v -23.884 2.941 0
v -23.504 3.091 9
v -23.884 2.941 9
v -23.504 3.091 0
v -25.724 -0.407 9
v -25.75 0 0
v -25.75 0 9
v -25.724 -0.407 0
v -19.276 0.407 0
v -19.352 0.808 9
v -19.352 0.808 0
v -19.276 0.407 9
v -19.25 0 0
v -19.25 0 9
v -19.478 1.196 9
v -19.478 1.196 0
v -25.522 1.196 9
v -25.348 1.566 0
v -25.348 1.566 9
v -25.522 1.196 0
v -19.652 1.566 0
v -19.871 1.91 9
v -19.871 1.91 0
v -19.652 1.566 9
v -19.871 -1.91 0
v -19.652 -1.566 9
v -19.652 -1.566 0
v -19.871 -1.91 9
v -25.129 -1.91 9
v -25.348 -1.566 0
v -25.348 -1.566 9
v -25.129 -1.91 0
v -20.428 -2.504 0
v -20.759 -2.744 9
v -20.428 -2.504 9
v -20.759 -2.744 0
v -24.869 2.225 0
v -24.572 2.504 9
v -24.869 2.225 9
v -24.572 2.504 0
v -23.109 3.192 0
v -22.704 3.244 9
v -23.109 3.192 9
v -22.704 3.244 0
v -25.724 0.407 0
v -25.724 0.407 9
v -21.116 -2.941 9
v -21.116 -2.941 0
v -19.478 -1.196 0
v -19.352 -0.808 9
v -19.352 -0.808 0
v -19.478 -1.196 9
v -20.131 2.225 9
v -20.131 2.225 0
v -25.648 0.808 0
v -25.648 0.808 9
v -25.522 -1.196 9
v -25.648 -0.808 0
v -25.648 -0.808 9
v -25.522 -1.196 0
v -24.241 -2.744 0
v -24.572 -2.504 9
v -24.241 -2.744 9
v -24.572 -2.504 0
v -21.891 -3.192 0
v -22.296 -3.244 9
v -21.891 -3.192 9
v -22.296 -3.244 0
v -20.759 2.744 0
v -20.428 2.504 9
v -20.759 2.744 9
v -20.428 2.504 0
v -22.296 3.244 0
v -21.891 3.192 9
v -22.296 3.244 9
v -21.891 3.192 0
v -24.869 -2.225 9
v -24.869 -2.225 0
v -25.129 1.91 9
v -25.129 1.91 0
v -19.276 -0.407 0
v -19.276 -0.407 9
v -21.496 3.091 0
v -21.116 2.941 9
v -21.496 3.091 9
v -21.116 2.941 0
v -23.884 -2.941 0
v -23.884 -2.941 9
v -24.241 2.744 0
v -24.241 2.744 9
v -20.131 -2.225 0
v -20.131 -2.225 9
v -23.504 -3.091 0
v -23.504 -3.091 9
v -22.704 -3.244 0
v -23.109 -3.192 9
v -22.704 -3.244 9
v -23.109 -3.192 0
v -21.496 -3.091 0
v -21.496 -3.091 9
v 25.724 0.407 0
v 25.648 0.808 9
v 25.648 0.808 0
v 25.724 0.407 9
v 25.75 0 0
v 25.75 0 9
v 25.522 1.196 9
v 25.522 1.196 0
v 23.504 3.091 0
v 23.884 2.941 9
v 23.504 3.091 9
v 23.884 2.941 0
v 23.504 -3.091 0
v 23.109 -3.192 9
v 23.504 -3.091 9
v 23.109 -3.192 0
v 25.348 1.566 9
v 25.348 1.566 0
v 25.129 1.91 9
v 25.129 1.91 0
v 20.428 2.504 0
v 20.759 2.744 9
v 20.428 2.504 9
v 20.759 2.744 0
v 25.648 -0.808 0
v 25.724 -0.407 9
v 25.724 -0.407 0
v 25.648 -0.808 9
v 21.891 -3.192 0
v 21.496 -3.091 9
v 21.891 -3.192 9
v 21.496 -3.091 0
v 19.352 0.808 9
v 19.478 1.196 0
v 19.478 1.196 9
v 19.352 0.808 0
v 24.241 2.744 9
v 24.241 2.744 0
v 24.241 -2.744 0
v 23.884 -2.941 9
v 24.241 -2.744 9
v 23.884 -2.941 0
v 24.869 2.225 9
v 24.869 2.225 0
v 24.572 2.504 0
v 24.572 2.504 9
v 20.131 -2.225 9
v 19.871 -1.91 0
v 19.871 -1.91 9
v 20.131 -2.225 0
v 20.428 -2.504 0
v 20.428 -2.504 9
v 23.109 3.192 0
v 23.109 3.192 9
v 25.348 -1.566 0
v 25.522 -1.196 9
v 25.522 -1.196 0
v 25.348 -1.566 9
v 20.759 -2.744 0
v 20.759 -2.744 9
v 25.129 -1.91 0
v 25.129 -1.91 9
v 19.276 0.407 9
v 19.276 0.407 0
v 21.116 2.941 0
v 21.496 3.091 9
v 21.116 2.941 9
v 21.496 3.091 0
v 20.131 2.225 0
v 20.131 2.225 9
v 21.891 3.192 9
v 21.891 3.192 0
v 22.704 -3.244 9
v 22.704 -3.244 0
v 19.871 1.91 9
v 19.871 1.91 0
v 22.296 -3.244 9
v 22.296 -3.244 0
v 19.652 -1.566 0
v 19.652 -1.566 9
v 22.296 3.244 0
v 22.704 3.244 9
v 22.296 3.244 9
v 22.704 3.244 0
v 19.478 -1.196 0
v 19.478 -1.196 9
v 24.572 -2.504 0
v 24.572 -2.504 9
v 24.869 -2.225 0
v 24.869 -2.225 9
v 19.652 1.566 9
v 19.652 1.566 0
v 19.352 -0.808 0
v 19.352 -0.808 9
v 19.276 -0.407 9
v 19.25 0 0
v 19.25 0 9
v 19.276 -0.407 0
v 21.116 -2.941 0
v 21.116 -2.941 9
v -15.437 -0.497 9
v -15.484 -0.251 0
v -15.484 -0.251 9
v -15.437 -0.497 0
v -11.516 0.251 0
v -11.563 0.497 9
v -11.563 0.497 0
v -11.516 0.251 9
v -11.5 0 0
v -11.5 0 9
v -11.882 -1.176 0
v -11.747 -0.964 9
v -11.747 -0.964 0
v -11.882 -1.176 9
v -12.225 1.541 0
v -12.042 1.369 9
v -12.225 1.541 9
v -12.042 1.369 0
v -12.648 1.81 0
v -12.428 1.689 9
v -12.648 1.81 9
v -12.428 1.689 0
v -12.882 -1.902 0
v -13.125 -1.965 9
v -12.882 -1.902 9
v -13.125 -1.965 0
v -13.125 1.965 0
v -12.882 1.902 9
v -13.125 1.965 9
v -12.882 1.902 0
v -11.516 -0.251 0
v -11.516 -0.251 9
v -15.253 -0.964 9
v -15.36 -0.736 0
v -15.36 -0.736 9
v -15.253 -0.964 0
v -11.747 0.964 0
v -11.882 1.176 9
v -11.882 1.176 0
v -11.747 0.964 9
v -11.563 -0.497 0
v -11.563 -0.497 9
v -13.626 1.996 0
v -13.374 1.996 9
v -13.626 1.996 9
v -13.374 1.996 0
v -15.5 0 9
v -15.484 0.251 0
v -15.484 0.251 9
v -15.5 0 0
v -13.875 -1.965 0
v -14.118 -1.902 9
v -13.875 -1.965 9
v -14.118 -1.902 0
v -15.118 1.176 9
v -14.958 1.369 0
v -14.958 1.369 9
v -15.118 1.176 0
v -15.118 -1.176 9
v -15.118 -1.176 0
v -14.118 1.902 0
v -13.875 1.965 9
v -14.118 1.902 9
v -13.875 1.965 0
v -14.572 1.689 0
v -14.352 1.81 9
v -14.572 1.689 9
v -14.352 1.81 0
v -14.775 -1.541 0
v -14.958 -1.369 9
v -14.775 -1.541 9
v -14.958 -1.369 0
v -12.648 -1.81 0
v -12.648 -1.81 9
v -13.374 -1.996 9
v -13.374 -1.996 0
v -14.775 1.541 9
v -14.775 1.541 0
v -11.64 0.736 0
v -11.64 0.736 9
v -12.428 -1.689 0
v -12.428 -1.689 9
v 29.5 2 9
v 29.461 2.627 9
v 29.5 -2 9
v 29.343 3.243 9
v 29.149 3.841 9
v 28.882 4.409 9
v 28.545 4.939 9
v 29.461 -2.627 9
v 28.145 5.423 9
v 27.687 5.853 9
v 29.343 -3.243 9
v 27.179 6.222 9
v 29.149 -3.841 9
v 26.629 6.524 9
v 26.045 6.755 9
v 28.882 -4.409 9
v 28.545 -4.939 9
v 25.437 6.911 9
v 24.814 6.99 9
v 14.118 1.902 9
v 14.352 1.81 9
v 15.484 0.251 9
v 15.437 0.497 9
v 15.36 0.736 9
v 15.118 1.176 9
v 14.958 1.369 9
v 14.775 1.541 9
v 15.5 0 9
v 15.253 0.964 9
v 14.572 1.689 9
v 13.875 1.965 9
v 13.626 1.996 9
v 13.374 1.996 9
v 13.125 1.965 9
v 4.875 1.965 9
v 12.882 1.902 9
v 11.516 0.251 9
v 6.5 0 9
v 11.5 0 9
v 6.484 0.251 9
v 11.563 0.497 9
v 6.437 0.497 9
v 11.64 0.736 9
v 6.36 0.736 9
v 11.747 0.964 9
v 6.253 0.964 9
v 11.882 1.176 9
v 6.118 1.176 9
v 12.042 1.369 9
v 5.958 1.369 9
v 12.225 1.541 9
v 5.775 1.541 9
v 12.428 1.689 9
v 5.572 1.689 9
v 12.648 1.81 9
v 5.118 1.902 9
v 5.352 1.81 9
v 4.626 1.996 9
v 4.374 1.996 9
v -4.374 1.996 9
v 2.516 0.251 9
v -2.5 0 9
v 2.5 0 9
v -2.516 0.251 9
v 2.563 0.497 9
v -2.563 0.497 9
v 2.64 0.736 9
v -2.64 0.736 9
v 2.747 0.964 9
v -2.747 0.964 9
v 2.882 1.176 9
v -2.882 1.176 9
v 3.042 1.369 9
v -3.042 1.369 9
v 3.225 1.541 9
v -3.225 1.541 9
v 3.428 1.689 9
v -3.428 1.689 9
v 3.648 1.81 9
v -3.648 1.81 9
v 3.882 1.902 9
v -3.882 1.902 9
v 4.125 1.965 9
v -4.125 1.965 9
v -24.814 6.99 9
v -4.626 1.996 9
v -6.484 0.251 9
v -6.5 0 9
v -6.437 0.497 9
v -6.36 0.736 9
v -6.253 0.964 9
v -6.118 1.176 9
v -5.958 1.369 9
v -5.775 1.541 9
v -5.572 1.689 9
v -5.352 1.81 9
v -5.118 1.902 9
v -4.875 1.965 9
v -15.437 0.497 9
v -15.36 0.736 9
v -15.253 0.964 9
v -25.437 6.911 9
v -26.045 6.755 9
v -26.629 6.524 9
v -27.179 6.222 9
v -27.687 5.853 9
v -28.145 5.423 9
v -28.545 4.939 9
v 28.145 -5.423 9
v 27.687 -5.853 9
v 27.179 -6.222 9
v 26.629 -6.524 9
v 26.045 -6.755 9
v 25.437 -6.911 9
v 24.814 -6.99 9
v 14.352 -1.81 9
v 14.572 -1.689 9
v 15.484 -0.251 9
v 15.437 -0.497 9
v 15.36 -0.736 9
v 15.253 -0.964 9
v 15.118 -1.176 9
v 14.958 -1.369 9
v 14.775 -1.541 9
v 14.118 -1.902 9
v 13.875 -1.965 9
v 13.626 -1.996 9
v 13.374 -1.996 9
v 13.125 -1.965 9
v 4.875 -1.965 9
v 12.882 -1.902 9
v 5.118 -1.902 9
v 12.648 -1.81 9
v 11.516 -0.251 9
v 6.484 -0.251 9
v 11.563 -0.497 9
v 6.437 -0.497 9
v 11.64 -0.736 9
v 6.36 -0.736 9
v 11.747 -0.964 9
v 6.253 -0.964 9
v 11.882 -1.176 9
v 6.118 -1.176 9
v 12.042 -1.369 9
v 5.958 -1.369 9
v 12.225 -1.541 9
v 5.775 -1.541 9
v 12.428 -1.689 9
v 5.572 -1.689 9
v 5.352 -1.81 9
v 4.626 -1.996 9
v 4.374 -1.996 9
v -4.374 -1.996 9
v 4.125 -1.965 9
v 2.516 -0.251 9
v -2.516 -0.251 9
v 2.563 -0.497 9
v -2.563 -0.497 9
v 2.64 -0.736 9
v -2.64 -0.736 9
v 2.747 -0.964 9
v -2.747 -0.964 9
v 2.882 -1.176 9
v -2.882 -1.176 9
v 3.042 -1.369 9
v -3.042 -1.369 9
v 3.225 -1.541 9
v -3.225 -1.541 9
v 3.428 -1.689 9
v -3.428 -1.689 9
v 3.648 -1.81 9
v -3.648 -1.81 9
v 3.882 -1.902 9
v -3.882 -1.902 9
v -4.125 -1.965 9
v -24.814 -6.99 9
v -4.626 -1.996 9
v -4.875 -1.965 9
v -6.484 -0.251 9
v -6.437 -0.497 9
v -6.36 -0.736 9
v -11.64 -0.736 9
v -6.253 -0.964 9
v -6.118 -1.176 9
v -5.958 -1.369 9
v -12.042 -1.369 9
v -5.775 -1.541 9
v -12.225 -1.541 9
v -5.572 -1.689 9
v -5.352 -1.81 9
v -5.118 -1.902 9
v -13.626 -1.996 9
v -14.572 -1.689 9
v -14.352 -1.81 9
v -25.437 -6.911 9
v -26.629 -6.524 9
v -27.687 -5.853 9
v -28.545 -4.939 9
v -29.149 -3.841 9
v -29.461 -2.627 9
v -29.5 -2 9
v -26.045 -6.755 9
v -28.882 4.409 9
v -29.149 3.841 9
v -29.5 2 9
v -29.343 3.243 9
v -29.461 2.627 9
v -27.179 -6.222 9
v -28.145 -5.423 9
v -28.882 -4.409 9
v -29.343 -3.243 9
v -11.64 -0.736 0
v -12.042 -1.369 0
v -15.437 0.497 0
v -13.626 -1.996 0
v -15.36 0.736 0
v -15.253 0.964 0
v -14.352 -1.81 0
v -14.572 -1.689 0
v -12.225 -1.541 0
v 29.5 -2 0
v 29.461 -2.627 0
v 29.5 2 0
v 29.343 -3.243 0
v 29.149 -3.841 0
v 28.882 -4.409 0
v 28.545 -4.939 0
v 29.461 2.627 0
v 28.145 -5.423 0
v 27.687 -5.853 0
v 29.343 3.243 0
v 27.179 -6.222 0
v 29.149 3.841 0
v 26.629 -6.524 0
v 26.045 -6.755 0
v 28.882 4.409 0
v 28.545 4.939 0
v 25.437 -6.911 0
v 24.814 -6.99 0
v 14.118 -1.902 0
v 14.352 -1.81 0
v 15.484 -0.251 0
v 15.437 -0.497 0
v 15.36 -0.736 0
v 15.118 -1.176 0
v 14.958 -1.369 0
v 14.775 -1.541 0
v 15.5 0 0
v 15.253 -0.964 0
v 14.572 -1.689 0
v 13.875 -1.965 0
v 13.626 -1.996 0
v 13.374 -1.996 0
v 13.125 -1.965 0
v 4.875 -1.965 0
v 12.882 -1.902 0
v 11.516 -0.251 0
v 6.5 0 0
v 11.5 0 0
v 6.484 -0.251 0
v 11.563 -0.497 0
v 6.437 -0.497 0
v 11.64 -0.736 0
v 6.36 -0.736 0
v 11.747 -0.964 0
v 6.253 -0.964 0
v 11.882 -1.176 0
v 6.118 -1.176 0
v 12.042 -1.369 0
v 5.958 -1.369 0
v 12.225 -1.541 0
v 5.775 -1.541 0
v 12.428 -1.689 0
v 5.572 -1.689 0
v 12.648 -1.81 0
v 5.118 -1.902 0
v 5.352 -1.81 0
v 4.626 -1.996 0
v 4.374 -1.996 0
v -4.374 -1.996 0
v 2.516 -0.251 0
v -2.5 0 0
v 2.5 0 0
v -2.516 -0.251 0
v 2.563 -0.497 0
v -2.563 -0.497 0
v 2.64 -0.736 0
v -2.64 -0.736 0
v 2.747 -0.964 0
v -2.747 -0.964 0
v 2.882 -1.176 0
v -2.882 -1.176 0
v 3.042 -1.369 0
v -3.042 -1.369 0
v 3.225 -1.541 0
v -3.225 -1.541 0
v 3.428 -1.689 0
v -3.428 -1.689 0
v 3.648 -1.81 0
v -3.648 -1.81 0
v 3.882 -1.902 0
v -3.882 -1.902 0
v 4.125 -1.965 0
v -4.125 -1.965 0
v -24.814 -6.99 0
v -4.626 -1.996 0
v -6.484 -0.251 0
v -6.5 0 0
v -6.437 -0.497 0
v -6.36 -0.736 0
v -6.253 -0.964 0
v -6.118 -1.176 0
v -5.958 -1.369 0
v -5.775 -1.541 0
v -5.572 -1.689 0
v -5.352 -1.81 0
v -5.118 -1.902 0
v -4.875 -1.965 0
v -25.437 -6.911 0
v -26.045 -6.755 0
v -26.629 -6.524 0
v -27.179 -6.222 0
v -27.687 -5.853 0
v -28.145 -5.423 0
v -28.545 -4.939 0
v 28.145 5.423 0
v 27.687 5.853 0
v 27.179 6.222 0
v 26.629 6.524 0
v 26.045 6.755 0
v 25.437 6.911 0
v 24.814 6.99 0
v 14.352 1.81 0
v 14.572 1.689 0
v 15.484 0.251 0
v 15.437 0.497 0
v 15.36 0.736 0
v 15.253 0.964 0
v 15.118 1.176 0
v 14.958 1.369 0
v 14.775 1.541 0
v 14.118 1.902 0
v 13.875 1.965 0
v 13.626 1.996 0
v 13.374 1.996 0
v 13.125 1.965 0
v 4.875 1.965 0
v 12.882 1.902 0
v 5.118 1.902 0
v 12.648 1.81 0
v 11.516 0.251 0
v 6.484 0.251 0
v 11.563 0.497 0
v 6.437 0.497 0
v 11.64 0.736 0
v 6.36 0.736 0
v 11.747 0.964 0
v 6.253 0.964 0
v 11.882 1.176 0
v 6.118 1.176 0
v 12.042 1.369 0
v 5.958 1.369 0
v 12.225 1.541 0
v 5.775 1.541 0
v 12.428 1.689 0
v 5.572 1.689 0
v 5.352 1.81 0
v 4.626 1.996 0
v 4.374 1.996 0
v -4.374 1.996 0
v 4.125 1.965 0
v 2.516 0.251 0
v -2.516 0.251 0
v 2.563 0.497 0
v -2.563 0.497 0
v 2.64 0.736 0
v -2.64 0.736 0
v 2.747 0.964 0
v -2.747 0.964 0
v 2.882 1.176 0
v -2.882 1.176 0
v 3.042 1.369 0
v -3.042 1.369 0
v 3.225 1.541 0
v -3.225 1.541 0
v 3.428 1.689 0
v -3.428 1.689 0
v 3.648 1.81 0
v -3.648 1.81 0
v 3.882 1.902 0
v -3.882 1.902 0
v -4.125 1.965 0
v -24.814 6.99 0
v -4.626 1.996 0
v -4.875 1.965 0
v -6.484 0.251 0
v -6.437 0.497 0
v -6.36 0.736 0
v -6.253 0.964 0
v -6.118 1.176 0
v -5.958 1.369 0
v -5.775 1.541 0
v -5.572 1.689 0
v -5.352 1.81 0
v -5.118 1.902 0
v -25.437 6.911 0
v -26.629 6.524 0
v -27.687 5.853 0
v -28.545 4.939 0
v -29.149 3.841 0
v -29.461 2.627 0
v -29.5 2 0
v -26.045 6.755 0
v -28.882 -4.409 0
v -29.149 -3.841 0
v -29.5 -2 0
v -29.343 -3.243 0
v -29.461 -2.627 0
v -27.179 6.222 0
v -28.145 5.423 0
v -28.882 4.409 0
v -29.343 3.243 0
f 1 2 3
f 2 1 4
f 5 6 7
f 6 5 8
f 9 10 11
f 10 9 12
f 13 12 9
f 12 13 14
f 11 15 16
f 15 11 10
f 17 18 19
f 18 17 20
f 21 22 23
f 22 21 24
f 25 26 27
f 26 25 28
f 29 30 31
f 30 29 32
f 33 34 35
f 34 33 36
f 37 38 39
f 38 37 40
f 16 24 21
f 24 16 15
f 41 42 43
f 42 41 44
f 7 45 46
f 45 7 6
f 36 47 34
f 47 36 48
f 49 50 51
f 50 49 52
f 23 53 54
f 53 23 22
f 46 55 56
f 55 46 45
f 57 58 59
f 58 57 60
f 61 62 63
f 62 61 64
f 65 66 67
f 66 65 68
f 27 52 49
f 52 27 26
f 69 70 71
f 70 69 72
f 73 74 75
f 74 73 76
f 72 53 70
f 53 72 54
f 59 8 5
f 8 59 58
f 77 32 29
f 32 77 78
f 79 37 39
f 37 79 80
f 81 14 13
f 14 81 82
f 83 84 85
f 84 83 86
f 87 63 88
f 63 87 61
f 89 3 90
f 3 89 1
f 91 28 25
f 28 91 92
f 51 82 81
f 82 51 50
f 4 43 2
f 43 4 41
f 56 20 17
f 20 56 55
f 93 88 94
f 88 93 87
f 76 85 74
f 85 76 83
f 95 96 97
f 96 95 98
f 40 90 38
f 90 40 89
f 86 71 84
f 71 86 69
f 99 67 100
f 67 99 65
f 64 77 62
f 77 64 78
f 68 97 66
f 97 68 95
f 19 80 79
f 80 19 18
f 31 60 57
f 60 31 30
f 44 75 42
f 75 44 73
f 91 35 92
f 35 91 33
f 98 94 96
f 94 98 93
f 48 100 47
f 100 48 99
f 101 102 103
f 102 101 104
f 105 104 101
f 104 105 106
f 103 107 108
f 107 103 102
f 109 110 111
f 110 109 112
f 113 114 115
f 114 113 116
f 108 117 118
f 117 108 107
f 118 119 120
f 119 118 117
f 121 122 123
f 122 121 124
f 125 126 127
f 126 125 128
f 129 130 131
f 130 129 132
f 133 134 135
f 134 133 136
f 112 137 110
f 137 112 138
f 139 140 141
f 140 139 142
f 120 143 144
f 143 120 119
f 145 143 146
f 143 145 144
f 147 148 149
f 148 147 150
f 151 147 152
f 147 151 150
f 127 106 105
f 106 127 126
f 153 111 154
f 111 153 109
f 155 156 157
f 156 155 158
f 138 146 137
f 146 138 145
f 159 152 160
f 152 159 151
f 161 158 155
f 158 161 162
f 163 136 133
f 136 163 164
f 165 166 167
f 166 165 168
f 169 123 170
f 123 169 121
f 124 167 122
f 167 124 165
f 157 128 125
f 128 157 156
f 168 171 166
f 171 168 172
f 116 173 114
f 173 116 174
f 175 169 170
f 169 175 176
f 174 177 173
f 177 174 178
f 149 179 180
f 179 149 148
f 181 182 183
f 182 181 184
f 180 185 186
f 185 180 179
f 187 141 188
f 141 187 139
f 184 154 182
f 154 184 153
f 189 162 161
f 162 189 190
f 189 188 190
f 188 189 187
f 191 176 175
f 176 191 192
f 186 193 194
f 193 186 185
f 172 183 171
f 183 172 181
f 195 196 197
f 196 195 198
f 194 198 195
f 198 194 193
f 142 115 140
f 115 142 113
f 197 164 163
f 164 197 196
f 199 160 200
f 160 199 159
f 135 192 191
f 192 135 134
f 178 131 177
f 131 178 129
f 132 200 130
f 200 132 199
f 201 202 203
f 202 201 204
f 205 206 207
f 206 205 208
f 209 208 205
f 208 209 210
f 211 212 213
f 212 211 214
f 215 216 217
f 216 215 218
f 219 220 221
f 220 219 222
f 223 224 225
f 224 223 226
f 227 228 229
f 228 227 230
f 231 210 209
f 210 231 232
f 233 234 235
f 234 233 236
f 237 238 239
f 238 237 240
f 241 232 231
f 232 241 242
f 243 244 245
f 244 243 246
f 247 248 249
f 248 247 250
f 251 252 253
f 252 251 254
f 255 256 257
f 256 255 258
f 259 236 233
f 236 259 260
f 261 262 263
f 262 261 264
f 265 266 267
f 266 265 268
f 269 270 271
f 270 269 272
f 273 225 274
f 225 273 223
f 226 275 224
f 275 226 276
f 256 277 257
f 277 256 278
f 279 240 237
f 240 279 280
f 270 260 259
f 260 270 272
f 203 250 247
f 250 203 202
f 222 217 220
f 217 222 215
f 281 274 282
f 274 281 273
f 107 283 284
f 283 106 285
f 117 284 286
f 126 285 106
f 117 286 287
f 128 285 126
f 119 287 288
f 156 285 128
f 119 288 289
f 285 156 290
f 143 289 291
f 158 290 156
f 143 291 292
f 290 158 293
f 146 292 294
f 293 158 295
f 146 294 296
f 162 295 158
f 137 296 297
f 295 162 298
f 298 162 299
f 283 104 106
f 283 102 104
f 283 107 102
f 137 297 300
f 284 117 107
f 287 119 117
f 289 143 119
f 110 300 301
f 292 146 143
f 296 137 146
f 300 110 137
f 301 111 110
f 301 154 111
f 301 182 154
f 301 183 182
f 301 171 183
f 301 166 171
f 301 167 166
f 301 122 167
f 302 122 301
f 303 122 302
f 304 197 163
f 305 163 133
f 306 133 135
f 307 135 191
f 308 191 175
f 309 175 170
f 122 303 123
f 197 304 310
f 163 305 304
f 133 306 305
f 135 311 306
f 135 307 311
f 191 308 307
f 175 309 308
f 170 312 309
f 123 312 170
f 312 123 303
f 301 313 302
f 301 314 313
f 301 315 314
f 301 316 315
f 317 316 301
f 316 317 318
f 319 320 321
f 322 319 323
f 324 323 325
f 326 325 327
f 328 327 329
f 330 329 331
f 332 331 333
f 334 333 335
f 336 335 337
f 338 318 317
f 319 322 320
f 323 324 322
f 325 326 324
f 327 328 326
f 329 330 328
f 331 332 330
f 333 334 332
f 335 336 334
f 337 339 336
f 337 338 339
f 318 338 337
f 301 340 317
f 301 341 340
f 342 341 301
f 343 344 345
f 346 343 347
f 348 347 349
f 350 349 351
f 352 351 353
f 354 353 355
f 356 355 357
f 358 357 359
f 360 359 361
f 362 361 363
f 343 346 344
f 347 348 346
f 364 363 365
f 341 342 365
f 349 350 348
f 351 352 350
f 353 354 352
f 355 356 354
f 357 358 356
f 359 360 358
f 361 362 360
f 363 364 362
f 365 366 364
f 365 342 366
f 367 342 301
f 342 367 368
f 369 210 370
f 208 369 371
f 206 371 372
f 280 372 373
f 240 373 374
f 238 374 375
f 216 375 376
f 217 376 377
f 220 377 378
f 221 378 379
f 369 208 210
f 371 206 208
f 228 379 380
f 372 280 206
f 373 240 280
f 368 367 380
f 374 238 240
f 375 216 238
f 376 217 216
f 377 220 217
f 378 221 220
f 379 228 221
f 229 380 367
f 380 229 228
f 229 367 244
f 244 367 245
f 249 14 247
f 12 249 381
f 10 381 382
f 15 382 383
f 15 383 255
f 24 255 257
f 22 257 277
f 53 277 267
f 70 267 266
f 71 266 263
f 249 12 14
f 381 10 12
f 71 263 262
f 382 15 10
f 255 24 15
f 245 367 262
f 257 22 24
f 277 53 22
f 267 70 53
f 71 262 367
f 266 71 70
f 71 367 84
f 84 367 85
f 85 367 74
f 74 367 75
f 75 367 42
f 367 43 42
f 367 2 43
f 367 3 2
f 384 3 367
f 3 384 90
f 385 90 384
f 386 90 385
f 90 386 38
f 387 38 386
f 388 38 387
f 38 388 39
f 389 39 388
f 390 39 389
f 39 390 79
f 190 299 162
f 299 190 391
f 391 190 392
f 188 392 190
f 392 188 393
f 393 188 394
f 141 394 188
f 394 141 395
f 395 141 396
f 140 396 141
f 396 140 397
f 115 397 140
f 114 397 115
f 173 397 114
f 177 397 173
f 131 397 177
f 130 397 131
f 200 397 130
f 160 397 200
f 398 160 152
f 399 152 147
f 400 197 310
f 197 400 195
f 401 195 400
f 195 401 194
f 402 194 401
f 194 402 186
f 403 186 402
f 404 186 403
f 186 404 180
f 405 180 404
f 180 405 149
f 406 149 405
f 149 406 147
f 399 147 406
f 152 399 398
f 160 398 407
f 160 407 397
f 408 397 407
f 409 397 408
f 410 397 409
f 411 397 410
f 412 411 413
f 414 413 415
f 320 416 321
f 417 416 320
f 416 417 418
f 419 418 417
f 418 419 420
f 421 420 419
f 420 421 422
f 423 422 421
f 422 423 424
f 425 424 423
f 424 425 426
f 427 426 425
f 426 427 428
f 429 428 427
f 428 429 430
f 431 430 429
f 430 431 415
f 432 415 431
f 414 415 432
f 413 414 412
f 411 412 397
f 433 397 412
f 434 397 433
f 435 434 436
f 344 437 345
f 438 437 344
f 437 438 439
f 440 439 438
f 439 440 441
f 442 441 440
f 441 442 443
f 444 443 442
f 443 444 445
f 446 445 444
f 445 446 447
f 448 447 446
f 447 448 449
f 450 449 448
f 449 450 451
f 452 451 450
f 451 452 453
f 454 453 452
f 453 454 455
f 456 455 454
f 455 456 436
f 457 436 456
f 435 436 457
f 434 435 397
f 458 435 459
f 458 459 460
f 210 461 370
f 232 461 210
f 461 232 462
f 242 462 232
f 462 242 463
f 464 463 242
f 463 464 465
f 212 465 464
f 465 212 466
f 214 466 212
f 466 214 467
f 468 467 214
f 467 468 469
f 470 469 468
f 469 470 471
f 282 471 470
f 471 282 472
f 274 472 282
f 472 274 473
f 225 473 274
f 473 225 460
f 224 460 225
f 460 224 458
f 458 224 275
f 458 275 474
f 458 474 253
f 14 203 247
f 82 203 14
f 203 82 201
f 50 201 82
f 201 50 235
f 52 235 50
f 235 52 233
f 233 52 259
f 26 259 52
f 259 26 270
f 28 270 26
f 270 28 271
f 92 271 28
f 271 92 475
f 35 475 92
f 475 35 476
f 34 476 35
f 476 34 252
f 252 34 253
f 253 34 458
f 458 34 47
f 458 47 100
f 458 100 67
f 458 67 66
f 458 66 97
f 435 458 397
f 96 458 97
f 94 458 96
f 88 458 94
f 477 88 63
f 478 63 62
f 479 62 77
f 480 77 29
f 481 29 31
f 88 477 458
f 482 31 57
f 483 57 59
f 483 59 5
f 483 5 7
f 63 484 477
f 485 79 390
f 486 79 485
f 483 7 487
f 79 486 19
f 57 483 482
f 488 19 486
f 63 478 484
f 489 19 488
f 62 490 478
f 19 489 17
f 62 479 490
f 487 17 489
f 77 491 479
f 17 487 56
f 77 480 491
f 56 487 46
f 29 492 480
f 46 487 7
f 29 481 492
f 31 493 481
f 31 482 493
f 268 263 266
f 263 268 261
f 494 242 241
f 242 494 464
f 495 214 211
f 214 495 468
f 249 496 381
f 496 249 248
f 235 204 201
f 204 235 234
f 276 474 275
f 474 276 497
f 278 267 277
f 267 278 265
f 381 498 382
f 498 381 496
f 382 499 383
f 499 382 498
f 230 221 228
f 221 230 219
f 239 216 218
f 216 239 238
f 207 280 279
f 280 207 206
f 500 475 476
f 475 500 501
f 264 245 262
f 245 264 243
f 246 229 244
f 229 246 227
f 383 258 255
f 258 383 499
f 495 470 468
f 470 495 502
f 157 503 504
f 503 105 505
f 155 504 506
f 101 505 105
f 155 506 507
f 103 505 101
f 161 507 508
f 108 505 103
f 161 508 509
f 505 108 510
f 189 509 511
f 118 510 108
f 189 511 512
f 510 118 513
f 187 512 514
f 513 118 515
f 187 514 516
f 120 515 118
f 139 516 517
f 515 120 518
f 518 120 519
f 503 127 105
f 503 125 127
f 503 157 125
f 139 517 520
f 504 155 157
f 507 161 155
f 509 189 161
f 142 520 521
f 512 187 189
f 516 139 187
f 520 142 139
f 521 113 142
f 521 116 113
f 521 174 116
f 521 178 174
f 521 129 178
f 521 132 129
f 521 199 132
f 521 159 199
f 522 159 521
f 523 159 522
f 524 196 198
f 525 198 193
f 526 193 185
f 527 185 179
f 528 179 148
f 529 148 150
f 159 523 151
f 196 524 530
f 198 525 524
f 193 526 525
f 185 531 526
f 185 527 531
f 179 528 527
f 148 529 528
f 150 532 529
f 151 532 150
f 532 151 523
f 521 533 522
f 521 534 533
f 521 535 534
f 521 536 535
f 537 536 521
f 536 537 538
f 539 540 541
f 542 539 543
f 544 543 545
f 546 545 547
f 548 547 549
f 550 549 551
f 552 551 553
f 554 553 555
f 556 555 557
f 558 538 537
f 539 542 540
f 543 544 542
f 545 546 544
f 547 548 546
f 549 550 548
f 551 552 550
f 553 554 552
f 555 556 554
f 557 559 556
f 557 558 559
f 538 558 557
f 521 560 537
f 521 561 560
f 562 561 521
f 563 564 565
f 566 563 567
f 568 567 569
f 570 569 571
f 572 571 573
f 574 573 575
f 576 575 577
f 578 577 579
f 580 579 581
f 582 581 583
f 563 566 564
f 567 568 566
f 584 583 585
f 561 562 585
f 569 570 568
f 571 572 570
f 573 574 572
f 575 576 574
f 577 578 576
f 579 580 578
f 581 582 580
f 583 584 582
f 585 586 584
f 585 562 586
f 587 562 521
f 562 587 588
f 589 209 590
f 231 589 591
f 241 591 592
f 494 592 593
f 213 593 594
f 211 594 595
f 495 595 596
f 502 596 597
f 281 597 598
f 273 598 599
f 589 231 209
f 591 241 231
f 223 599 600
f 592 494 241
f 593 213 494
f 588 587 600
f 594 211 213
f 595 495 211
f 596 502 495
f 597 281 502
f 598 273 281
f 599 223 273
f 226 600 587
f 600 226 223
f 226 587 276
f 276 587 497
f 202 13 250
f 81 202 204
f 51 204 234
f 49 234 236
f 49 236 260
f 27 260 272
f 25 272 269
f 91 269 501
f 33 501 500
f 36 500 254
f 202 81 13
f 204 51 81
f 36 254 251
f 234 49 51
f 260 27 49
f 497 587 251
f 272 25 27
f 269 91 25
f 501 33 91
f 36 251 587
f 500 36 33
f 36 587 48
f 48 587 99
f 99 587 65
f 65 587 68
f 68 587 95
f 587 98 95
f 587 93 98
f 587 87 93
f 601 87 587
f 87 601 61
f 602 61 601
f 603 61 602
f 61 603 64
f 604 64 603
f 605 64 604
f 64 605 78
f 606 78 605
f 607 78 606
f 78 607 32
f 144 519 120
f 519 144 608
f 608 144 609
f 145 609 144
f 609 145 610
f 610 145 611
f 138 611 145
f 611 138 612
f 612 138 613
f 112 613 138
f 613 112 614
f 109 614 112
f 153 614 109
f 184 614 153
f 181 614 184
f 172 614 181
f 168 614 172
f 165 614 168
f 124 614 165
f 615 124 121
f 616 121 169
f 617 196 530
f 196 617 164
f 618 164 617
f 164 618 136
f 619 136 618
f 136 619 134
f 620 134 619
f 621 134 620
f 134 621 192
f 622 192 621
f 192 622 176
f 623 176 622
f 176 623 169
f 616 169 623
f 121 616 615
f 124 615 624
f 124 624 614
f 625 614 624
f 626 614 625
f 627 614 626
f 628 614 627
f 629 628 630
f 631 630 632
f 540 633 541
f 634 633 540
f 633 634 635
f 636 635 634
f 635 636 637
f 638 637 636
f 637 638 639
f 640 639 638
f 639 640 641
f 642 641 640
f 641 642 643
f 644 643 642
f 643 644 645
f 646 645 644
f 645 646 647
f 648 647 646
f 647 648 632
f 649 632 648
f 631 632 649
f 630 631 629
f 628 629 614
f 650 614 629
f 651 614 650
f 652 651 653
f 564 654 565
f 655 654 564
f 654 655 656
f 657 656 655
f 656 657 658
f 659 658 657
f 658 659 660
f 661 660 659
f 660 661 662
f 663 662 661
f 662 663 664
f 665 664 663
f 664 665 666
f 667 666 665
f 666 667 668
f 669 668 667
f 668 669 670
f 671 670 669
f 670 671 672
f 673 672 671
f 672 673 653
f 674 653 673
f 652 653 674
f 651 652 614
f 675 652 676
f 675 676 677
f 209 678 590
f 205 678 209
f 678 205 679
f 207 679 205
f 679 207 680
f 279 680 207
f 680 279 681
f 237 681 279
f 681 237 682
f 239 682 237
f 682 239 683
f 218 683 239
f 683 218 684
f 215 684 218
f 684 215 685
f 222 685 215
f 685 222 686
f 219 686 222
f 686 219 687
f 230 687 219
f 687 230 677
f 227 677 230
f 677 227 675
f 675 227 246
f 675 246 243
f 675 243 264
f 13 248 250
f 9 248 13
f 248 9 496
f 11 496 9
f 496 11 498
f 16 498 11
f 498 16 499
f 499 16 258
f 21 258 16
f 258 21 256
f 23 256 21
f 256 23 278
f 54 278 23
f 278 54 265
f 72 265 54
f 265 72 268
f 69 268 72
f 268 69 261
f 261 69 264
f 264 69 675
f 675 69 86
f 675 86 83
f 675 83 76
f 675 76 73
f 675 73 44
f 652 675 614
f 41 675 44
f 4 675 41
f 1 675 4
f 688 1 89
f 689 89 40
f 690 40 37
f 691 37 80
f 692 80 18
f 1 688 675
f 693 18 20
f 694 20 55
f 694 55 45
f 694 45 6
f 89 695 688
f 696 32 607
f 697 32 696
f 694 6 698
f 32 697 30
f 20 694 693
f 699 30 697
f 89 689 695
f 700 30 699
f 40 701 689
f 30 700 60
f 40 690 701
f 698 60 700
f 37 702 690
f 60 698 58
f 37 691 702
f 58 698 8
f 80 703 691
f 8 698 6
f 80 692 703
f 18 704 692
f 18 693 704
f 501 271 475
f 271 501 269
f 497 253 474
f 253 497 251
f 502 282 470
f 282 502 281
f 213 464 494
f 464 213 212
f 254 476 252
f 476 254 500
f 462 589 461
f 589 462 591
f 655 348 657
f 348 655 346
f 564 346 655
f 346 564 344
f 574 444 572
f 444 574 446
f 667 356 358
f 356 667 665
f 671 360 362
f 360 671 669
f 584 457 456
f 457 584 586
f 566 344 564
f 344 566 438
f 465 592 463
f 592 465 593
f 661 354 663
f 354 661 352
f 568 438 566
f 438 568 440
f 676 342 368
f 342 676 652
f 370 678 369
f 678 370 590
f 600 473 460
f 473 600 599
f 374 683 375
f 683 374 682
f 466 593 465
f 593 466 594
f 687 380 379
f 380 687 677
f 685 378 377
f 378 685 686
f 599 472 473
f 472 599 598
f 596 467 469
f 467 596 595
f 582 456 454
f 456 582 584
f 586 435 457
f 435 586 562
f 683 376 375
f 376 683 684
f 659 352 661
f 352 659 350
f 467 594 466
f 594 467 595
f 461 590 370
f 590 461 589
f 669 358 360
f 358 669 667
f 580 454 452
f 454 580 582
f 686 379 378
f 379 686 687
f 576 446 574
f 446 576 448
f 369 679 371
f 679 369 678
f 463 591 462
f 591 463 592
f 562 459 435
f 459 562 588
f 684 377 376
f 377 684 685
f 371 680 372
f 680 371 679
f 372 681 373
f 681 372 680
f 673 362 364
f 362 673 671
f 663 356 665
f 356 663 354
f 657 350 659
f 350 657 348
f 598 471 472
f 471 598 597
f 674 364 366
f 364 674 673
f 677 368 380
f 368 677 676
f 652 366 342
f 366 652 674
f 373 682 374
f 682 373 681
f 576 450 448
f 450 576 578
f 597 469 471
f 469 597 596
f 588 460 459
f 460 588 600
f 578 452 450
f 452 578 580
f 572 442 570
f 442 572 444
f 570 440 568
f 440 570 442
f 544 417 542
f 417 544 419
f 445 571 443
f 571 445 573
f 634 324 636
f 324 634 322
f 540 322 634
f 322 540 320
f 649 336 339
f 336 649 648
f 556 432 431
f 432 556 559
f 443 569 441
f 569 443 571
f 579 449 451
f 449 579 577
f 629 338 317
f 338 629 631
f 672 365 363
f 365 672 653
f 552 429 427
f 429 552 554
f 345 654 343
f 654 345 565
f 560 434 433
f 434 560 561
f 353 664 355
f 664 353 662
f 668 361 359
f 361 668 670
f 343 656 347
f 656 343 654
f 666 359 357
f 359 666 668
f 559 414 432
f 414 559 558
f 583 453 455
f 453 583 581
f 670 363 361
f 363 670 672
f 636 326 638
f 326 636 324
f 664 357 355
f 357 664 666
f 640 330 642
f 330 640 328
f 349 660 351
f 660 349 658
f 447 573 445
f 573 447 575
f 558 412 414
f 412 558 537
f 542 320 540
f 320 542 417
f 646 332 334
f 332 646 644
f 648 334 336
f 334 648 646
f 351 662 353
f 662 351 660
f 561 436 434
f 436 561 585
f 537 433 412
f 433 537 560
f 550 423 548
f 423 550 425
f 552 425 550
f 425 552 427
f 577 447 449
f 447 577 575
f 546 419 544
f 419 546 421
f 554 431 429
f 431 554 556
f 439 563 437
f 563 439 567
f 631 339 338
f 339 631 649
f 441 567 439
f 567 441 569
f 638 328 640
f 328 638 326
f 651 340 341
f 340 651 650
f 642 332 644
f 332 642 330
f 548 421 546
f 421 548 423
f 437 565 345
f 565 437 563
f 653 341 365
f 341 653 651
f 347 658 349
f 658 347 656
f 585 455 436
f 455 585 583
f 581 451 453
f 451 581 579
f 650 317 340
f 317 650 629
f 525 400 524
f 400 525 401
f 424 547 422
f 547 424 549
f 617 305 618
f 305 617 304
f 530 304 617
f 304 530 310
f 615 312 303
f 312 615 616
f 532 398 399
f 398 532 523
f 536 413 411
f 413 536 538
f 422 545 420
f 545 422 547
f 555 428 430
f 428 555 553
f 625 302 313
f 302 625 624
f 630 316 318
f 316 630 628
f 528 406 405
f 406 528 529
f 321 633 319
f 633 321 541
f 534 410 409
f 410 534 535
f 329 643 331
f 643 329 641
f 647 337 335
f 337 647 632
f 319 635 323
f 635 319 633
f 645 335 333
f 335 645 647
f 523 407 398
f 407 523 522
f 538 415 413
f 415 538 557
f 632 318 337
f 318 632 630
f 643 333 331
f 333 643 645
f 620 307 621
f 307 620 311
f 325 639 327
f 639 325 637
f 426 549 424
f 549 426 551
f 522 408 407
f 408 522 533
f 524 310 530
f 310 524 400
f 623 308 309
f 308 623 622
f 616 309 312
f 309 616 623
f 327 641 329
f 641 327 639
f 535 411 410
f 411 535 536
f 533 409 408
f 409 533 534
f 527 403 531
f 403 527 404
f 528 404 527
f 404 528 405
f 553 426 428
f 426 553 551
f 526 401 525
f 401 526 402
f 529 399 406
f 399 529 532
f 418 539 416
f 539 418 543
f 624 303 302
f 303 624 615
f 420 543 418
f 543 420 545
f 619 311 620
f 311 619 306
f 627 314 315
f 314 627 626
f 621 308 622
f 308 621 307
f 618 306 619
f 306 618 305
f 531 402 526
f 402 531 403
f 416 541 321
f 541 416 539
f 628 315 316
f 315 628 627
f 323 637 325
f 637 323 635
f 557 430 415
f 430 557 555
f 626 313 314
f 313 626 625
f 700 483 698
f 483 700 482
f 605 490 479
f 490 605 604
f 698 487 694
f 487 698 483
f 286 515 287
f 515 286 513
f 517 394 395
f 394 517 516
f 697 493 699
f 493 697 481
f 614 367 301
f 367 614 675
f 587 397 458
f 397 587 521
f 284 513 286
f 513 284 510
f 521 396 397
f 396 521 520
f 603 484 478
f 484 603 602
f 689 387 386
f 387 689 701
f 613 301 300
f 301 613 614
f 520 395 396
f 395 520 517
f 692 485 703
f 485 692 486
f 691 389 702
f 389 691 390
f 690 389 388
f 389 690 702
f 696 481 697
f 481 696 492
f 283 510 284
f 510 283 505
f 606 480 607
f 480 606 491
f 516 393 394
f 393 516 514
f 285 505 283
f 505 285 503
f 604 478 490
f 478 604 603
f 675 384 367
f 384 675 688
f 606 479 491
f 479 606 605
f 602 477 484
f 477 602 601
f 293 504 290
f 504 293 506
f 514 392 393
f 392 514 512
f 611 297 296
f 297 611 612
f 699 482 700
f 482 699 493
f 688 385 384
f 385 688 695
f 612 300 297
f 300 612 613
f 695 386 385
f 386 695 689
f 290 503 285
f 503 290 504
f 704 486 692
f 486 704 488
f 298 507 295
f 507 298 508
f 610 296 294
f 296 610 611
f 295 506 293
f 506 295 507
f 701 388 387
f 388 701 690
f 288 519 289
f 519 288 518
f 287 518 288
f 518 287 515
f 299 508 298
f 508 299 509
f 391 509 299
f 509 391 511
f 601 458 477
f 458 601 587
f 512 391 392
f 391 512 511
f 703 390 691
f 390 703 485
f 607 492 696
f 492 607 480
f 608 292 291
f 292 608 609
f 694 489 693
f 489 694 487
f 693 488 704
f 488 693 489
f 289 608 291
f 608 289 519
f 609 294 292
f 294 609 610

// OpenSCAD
$fn = 50;


difference() {
	union() {
		hull() {
			translate(v = [-24.5000000000, 2.0000000000, 0]) {
				cylinder(h = 9, r = 5);
			}
			translate(v = [24.5000000000, 2.0000000000, 0]) {
				cylinder(h = 9, r = 5);
			}
			translate(v = [-24.5000000000, -2.0000000000, 0]) {
				cylinder(h = 9, r = 5);
			}
			translate(v = [24.5000000000, -2.0000000000, 0]) {
				cylinder(h = 9, r = 5);
			}
		}
	}
	union() {
		#translate(v = [-22.5000000000, 0.0000000000, 0]) {
			cylinder(h = 9, r = 3.2500000000);
		}
		#translate(v = [22.5000000000, 0.0000000000, 0]) {
			cylinder(h = 9, r = 3.2500000000);
		}
		#translate(v = [-22.5000000000, 0.0000000000, -100.0000000000]) {
			cylinder(h = 200, r = 3.2500000000);
		}
		#translate(v = [-22.5000000000, 0.0000000000, -100.0000000000]) {
			cylinder(h = 200, r = 3.2500000000);
		}
		#translate(v = [22.5000000000, 0.0000000000, -100.0000000000]) {
			cylinder(h = 200, r = 3.2500000000);
		}
		#translate(v = [22.5000000000, 0.0000000000, -100.0000000000]) {
			cylinder(h = 200, r = 3.2500000000);
		}
		#translate(v = [-22.5000000000, 0.0000000000, 0]) {
			cylinder(h = 9, r = 1.8000000000);
		}
		#translate(v = [22.5000000000, 0.0000000000, 0]) {
			cylinder(h = 9, r = 1.8000000000);
		}
		#translate(v = [-22.5000000000, 0.0000000000, 0]) {
			cylinder(h = 9, r = 1.8000000000);
		}
		#translate(v = [22.5000000000, 0.0000000000, 0]) {
			cylinder(h = 9, r = 1.8000000000);
		}
		#translate(v = [-22.5000000000, 0.0000000000, 0]) {
			cylinder(h = 9, r = 1.8000000000);
		}
		#translate(v = [22.5000000000, 0.0000000000, 0]) {
			cylinder(h = 9, r = 1.8000000000);
		}
		#translate(v = [-13.5000000000, 0, 0]) {
			cylinder(h = 9, r = 2.0000000000);
		}
		#translate(v = [-4.5000000000, 0, 0]) {
			cylinder(h = 9, r = 2.0000000000);
		}
		#translate(v = [4.5000000000, 0, 0]) {
			cylinder(h = 9, r = 2.0000000000);
		}
		#translate(v = [13.5000000000, 0, 0]) {
			cylinder(h = 9, r = 2.0000000000);
		}
	}
}
